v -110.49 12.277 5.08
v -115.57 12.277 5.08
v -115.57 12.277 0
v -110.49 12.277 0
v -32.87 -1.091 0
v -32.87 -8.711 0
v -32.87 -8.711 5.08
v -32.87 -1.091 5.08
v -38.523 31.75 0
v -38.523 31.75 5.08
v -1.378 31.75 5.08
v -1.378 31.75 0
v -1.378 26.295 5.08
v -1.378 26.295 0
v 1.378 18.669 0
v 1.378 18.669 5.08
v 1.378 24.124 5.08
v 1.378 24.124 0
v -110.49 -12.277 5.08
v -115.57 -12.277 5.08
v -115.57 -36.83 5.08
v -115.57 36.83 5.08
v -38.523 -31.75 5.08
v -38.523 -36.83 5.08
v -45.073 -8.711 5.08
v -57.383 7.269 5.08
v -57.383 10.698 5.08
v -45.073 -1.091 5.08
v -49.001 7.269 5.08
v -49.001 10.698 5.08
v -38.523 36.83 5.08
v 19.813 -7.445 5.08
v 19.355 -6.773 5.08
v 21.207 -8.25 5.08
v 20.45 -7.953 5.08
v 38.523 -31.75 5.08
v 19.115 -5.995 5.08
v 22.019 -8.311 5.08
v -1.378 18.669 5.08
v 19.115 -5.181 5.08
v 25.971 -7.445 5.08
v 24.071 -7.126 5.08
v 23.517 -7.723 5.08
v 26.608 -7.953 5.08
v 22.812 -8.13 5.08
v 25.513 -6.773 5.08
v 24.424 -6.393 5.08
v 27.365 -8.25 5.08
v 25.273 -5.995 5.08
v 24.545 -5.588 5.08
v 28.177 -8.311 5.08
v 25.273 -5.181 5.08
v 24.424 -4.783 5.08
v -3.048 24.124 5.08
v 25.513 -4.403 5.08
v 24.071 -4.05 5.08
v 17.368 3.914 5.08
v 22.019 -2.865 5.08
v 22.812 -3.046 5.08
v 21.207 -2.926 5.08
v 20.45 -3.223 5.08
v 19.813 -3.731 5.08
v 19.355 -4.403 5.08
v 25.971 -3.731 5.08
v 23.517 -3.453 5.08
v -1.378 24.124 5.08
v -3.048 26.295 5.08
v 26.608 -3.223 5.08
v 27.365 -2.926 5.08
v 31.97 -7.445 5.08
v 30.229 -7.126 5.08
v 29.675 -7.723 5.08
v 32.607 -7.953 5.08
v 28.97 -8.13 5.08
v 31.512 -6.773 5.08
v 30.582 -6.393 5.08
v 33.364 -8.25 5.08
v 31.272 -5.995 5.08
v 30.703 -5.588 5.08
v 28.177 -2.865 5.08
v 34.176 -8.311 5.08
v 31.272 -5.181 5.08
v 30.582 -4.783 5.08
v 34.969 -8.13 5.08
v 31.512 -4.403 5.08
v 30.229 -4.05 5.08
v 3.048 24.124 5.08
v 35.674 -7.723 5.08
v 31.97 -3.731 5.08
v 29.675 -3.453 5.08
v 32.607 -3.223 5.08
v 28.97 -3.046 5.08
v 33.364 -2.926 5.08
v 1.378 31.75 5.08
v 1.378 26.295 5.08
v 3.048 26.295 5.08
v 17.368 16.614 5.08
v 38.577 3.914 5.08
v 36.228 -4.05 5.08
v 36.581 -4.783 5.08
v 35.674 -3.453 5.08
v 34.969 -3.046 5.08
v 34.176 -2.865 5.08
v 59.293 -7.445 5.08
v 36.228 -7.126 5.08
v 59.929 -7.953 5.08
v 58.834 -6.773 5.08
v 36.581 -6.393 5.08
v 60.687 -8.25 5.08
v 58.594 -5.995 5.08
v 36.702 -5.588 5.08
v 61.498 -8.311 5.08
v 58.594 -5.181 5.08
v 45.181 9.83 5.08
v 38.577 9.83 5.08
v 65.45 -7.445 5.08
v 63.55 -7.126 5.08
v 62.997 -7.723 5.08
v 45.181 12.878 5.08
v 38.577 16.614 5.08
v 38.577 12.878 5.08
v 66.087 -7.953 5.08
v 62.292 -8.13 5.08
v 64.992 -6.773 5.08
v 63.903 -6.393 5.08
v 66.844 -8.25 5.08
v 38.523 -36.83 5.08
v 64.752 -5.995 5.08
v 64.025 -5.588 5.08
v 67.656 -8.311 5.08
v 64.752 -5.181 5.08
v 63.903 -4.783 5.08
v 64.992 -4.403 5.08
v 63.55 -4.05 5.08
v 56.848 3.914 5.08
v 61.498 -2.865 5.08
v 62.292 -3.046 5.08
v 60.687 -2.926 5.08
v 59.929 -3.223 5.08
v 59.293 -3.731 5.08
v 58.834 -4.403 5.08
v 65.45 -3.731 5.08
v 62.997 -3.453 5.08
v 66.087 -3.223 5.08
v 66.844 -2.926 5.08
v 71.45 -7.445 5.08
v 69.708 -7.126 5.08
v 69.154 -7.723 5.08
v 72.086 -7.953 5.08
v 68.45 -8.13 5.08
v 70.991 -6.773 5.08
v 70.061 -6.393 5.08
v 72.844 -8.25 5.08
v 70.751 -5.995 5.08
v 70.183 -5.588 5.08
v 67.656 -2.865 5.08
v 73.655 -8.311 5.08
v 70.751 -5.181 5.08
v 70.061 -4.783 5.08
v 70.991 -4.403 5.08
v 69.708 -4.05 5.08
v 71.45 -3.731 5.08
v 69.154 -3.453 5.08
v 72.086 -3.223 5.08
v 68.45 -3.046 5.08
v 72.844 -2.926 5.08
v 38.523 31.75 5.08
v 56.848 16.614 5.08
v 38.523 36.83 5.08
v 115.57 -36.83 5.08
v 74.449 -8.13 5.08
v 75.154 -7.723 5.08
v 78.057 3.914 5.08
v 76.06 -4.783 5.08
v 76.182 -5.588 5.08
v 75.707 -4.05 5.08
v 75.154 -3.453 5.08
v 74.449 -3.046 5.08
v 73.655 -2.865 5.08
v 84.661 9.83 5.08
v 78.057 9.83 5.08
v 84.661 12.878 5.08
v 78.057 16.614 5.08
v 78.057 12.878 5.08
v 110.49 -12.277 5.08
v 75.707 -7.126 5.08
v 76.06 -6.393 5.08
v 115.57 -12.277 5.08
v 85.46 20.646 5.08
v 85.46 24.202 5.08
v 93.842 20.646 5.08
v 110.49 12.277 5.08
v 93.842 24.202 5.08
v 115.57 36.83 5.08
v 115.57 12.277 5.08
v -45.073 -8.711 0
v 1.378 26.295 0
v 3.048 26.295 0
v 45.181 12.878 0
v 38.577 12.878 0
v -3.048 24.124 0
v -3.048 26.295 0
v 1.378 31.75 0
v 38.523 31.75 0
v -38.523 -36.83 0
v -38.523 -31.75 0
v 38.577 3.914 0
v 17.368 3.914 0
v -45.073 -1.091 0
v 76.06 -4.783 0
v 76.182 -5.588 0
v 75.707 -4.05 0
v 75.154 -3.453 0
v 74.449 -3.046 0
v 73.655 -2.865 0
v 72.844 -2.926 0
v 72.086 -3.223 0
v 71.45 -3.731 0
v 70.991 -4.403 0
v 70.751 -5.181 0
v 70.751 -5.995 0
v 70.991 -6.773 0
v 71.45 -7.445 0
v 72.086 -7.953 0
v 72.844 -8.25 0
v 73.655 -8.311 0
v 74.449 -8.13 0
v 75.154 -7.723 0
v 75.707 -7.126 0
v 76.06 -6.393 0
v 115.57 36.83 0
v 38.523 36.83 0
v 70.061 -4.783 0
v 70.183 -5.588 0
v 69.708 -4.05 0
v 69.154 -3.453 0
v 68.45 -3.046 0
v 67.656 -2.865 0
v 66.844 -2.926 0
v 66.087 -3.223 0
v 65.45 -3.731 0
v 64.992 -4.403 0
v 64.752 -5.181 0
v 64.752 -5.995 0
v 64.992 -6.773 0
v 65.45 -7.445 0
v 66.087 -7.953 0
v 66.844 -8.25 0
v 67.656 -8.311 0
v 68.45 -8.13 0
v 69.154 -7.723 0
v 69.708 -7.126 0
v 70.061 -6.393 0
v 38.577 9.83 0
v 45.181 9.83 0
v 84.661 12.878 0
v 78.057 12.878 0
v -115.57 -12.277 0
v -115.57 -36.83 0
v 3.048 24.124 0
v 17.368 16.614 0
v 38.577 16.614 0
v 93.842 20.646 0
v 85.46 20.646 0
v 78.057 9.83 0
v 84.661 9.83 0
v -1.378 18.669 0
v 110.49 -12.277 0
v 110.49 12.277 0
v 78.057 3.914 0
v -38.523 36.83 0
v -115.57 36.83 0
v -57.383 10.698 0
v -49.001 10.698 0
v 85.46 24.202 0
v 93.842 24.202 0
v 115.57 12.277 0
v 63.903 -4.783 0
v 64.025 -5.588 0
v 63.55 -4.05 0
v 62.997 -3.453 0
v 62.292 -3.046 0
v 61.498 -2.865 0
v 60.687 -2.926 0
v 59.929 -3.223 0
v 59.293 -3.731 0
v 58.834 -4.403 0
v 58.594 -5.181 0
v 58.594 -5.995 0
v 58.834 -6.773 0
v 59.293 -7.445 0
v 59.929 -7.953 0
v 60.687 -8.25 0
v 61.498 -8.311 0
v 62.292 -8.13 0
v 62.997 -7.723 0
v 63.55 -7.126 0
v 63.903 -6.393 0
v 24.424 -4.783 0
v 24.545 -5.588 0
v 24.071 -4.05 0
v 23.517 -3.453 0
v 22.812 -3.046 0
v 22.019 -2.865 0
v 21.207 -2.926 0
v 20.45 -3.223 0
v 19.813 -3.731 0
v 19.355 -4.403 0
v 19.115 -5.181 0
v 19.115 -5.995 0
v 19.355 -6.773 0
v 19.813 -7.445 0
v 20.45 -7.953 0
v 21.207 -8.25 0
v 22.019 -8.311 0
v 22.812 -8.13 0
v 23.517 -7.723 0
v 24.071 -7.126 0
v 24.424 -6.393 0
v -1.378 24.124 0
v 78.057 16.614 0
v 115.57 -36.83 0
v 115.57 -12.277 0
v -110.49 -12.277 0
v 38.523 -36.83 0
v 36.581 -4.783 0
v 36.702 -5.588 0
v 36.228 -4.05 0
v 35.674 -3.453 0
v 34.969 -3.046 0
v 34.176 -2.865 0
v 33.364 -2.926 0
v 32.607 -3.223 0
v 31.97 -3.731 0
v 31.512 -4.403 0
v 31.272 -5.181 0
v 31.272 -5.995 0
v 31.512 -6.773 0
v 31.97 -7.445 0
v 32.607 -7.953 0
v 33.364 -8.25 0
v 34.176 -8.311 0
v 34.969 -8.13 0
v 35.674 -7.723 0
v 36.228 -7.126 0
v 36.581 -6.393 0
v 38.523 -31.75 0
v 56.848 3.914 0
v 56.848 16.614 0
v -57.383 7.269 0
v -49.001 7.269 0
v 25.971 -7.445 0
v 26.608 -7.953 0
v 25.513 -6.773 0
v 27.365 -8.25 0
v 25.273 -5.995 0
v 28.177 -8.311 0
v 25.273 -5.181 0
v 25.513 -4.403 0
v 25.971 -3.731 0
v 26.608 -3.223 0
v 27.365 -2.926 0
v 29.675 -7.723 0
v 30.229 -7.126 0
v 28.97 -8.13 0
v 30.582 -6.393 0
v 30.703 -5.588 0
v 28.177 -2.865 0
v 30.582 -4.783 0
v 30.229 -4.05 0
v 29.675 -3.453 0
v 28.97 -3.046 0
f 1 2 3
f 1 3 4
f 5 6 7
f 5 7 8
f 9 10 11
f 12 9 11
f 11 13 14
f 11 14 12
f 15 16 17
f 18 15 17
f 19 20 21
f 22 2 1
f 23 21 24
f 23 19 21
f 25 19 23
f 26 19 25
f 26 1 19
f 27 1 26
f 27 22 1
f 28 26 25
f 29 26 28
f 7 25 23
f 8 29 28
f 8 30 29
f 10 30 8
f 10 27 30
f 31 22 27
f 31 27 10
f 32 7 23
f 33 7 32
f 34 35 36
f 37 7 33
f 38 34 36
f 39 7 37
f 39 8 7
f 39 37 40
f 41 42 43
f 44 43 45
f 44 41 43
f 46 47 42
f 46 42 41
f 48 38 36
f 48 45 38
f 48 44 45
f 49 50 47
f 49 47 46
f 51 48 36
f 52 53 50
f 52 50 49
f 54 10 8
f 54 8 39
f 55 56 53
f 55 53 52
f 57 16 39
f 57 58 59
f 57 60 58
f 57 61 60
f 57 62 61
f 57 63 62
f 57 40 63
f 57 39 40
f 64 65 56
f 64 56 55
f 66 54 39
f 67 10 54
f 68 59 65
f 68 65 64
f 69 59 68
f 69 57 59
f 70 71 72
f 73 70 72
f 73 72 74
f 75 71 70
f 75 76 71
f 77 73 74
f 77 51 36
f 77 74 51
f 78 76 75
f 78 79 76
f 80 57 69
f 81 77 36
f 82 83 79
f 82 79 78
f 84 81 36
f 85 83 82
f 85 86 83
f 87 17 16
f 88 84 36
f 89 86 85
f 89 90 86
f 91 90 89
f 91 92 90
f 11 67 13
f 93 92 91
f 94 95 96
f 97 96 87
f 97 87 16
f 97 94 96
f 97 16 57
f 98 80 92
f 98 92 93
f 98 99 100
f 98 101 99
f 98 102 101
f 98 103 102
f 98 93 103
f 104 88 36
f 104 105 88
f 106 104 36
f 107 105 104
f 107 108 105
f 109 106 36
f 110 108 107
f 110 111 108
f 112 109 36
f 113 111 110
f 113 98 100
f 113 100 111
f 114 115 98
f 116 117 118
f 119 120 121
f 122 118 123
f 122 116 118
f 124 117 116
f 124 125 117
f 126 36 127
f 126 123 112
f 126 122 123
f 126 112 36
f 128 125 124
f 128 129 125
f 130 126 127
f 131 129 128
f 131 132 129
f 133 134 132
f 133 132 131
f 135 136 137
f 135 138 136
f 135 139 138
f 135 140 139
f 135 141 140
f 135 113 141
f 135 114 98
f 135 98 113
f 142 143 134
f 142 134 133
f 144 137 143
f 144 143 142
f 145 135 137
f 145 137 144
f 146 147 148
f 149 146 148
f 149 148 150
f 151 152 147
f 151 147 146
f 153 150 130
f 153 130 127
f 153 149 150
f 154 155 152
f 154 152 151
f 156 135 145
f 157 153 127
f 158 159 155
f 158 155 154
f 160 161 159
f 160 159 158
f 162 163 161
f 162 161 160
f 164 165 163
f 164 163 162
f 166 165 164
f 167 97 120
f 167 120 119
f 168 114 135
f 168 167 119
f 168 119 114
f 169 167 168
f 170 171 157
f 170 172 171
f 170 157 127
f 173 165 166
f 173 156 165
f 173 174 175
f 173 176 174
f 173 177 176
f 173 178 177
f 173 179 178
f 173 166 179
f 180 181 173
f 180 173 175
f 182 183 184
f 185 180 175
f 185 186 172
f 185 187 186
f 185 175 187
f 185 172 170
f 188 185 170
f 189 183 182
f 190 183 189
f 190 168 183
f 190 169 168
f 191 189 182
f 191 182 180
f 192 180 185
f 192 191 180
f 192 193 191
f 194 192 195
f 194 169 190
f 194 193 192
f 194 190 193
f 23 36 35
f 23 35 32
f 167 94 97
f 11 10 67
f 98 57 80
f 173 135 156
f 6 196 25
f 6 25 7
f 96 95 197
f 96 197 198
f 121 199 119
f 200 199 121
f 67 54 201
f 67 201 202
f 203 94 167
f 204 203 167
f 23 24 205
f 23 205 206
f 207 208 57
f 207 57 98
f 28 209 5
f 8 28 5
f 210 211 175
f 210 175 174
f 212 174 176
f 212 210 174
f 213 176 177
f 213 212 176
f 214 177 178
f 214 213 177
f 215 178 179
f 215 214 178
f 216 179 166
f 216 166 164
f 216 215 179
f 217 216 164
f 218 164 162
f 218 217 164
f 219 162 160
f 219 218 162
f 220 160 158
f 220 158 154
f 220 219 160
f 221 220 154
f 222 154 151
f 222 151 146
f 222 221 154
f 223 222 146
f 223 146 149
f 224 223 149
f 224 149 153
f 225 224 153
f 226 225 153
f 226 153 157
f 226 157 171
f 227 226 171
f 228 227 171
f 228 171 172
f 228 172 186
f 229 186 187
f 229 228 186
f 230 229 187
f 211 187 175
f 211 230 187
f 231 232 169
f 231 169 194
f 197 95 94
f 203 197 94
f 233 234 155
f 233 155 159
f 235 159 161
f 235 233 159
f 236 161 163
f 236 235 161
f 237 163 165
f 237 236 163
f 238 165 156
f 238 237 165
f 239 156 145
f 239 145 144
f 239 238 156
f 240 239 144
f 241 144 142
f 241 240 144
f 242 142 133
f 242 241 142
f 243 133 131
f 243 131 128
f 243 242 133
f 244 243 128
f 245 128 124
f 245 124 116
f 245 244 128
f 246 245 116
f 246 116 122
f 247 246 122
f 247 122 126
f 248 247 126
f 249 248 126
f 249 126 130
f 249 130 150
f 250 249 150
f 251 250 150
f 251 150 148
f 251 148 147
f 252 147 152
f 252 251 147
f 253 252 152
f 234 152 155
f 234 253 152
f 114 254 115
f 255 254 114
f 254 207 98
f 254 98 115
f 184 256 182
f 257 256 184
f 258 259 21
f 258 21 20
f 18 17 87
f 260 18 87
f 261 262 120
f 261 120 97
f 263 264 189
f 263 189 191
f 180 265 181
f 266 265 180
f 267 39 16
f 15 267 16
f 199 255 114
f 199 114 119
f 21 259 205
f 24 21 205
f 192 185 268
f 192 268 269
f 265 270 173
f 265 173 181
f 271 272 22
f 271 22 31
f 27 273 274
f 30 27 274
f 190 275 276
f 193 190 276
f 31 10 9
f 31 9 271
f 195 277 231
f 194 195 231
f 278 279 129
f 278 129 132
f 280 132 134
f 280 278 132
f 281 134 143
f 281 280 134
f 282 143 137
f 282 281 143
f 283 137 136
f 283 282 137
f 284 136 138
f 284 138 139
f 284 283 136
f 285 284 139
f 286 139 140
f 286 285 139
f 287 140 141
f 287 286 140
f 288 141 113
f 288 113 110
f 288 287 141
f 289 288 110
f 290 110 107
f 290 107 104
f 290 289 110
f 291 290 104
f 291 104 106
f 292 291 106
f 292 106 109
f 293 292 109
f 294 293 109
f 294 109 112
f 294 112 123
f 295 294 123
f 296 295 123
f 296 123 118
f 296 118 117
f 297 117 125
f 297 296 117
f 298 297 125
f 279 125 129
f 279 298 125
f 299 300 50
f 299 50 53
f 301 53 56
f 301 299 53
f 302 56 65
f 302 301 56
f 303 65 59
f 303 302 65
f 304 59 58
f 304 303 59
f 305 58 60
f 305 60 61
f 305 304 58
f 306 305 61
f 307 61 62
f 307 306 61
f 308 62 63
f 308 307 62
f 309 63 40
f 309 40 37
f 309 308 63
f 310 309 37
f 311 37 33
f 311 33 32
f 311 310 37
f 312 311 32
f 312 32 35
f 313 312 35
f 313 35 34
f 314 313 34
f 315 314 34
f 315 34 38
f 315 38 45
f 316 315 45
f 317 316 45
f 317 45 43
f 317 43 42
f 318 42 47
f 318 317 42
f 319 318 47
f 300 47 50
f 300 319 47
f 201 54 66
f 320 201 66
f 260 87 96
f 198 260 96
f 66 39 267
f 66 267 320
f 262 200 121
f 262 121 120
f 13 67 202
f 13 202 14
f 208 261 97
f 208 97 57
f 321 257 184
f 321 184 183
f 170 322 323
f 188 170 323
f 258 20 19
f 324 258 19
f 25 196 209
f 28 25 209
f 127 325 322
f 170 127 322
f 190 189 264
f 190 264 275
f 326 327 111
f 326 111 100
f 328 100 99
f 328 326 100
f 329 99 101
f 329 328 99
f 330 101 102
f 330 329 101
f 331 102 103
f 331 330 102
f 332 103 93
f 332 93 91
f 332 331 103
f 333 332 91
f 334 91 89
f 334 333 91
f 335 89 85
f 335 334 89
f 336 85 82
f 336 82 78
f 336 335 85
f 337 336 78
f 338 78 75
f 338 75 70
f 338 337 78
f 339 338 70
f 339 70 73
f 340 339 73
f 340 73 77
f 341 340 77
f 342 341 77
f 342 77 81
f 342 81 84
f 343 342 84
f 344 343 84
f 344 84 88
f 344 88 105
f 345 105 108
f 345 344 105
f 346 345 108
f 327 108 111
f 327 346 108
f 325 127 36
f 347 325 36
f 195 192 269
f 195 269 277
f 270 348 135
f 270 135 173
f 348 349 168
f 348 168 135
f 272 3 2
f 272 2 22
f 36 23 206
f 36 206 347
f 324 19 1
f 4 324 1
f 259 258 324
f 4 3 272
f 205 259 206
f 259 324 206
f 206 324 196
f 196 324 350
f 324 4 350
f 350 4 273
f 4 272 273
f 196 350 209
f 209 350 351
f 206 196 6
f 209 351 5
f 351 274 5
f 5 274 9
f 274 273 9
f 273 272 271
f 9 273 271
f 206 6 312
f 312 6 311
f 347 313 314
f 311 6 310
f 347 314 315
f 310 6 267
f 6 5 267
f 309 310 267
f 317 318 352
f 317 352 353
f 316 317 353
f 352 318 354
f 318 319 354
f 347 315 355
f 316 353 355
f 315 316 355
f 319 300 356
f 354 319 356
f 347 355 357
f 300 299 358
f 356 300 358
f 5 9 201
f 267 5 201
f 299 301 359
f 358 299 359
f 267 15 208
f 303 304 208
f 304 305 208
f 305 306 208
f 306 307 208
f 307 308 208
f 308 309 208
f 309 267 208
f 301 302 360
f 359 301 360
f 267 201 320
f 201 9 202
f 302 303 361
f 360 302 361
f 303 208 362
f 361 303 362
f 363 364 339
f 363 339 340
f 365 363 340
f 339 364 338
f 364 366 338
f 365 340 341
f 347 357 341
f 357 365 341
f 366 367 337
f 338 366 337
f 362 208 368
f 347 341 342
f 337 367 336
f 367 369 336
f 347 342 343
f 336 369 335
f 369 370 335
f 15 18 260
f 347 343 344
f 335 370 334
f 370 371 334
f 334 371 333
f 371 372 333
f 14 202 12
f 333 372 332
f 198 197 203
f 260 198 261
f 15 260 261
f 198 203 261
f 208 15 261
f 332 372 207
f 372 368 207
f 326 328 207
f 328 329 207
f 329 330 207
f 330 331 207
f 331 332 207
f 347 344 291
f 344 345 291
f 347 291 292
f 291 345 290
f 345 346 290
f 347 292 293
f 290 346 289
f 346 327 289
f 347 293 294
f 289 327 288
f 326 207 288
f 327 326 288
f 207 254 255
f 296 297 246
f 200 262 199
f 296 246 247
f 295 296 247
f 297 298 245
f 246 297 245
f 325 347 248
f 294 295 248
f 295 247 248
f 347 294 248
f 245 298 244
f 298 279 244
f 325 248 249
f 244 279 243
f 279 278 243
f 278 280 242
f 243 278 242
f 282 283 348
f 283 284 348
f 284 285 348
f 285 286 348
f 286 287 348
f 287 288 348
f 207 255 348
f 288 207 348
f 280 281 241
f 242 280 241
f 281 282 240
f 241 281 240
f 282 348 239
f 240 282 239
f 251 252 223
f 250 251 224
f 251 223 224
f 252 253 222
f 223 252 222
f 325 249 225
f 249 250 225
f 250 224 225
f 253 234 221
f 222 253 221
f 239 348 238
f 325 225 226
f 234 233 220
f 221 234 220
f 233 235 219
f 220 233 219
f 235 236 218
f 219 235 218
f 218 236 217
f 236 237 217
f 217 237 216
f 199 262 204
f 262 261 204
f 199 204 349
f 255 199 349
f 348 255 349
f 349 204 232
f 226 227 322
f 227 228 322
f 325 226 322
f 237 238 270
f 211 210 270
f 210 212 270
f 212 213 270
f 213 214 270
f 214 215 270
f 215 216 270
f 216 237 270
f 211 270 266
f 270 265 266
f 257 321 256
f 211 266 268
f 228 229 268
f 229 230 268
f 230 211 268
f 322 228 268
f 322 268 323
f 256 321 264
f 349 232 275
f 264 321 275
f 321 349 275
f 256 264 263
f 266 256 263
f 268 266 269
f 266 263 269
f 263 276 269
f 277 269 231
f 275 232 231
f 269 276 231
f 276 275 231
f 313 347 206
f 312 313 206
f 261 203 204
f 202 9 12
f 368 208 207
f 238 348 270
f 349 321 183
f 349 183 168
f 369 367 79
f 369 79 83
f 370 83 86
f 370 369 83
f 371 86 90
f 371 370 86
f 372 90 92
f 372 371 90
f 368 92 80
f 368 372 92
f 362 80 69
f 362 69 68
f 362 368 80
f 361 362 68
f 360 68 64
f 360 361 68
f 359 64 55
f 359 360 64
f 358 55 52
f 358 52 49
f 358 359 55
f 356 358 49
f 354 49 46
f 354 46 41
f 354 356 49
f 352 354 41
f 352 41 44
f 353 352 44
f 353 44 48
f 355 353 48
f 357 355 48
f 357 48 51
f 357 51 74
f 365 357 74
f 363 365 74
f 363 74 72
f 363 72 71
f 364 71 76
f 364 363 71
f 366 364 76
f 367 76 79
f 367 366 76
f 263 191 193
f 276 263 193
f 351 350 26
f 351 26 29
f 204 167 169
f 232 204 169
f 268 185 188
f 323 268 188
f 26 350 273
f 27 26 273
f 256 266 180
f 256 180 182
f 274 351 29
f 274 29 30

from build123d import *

# Parameters (mm, degrees)
SKETCH1_W           = 231.14
SKETCH1_H           = 73.66
BOSS_EXTRUDE1_DEPTH = 5.08
SKETCH2_W           = 77.046666666
SKETCH2_H           = 5.08
CUT_EXTRUDE1_DEPTH  = 122.402966191
SKETCH3_W           = 5.08
SKETCH3_H           = 24.553333334
CUT_EXTRUDE2_DEPTH  = 122.402966191
SKETCH5_W           = 2.7559
SKETCH5_H           = 13.081
CUT_EXTRUDE4_DEPTH  = 122.402966191
SKETCH6_W           = 6.096
SKETCH6_H           = 2.1717
CUT_EXTRUDE5_DEPTH  = 122.402966191
CAVITY1_OUTLINE_R   = 2.7305
CAVITY1_OUTLINE_W   = 12.202797109
CAVITY1_OUTLINE_H   = 7.62
CAVITY1_OUTLINE_W_2 = 8.382
CAVITY1_OUTLINE_H_2 = 3.429
CAVITY1_OUTLINE_H_3 = 3.556
CAVITY1_DEPTH       = 5.08


# Read off the part's stored shape, not the designer's step: Cavity1
with BuildPart() as part:
    # Sketch1 → Boss-Extrude1 (new body)
    with BuildSketch(Plane.XY):
        Rectangle(SKETCH1_W, SKETCH1_H)
    extrude(amount=BOSS_EXTRUDE1_DEPTH)

    # Sketch2 → Cut-Extrude1 (cut, through all)
    with BuildSketch(Plane.XY.offset(5.08)):
        with Locations((0, -34.29)):
            Rectangle(SKETCH2_W, SKETCH2_H)
        with Locations((0, 34.29)):
            Rectangle(SKETCH2_W, SKETCH2_H)
    extrude(amount=-CUT_EXTRUDE1_DEPTH, mode=Mode.SUBTRACT)

    # Sketch3 → Cut-Extrude2 (cut, through all)
    with BuildSketch(Plane.XY.offset(5.08)):
        with Locations((-113.03, 0)):
            Rectangle(SKETCH3_W, SKETCH3_H)
        with Locations((113.03, 0)):
            Rectangle(SKETCH3_W, SKETCH3_H)
    extrude(amount=-CUT_EXTRUDE2_DEPTH, mode=Mode.SUBTRACT)

    # Sketch5 → Cut-Extrude4 (cut, through all)
    with BuildSketch(Plane.XY.offset(5.08)):
        with Locations((0, 25.2095)):
            Rectangle(SKETCH5_W, SKETCH5_H)
    extrude(amount=-CUT_EXTRUDE4_DEPTH, mode=Mode.SUBTRACT)

    # Sketch6 → Cut-Extrude5 (cut, through all)
    with BuildSketch(Plane.XY.offset(5.08)):
        with Locations((0, 25.2095)):
            Rectangle(SKETCH6_W, SKETCH6_H)
    extrude(amount=-CUT_EXTRUDE5_DEPTH, mode=Mode.SUBTRACT)

    # Cavity1 outline → Cavity1 (cut)
    with BuildSketch(Plane.XY):
        with Locations((21.814879295, -5.588)):
            Circle(CAVITY1_OUTLINE_R)
        with Locations((27.972778565, -5.588)):
            Circle(CAVITY1_OUTLINE_R)
        with Locations((33.971893142, -5.588)):
            Circle(CAVITY1_OUTLINE_R)
        Polygon((38.577278565, 12.877703873), (38.577278565, 16.614191805), (17.368278565, 16.614191805), (17.368278565, 3.914191805), (38.577278565, 3.914191805), (38.577278565, 9.829703873), (45.181278565, 9.829703873), (45.181278565, 12.877703873), align=None)
        Polygon((56.847527144, 3.914191805), (78.056527144, 3.914191805), (78.056527144, 9.829703873), (84.660527144, 9.829703873), (84.660527144, 12.877703873), (78.056527144, 12.877703873), (78.056527144, 16.614191805), (56.847527144, 16.614191805), align=None)
        with Locations((61.294127875, -5.588)):
            Circle(CAVITY1_OUTLINE_R)
        with Locations((67.452027144, -5.588)):
            Circle(CAVITY1_OUTLINE_R)
        with Locations((73.451141721, -5.588)):
            Circle(CAVITY1_OUTLINE_R)
        with Locations((-38.971851196, -4.900880915)):
            Rectangle(CAVITY1_OUTLINE_W, CAVITY1_OUTLINE_H)
        with Locations((-53.192397728, 8.983802784)):
            Rectangle(CAVITY1_OUTLINE_W_2, CAVITY1_OUTLINE_H_2)
        with Locations((89.651170694, 22.423911141)):
            Rectangle(CAVITY1_OUTLINE_W_2, CAVITY1_OUTLINE_H_3)
    extrude(amount=CAVITY1_DEPTH, mode=Mode.SUBTRACT)


solid = part.part
